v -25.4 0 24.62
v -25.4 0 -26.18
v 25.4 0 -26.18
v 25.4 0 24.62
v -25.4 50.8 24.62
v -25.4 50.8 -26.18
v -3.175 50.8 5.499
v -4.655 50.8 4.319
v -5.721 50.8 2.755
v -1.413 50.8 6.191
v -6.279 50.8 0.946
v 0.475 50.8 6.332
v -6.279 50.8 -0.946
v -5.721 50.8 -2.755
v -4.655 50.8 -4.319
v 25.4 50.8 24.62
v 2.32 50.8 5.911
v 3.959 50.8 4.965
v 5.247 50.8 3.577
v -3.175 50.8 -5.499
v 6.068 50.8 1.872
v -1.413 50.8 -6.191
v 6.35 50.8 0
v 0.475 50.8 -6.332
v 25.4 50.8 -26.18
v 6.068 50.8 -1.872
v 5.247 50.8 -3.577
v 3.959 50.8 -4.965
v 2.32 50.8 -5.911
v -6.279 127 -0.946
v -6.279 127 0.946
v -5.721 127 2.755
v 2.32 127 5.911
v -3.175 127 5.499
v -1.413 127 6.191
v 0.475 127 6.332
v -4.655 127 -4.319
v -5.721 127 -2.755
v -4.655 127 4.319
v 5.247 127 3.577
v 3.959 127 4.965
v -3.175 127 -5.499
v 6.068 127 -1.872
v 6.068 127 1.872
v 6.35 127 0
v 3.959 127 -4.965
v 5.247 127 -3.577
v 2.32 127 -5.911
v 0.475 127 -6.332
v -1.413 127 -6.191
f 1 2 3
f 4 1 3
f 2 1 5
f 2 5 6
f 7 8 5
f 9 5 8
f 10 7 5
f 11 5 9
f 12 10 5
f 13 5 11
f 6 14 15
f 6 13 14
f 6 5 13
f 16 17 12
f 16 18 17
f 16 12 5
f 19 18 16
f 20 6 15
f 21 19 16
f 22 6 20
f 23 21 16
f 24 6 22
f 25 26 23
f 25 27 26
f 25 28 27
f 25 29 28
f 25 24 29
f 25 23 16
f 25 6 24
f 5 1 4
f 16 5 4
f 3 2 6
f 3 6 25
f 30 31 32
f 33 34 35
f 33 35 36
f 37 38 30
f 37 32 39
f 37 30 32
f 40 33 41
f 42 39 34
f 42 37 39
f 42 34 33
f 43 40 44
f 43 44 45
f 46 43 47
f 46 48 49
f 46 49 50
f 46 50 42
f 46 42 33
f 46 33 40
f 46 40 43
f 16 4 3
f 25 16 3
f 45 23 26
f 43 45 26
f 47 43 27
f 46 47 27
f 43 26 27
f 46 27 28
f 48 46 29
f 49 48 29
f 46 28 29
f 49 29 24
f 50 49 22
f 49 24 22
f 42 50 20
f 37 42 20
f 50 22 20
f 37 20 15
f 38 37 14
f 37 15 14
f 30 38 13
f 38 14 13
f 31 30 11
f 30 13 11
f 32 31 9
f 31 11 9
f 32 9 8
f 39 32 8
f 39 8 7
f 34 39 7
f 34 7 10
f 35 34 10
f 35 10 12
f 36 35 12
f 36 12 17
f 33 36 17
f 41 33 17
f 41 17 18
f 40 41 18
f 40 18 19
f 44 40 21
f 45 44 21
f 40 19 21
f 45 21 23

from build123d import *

# Parameters (mm, degrees)
SKETCH1_W           = 50.8
SKETCH1_H           = 50.8
BOSS_EXTRUDE1_DEPTH = 50.8
SKETCH2_R           = 6.35
BOSS_EXTRUDE2_DEPTH = 76.2


with BuildPart() as part:
    # Sketch1 → Boss-Extrude1 (new body)
    with BuildSketch(Plane(origin=(0, 0, 0), x_dir=(1, 0, 0), z_dir=(0, 1, 0))):
        with Locations((0, 0.779824561)):
            Rectangle(SKETCH1_W, SKETCH1_H)
    extrude(amount=BOSS_EXTRUDE1_DEPTH)

    # Sketch2 → Boss-Extrude2 (add)
    with BuildSketch(Plane(origin=(0, 50.8, 0), x_dir=(1, 0, 0), z_dir=(0, 1, 0))):
        Circle(SKETCH2_R)
    extrude(amount=BOSS_EXTRUDE2_DEPTH)


solid = part.part
